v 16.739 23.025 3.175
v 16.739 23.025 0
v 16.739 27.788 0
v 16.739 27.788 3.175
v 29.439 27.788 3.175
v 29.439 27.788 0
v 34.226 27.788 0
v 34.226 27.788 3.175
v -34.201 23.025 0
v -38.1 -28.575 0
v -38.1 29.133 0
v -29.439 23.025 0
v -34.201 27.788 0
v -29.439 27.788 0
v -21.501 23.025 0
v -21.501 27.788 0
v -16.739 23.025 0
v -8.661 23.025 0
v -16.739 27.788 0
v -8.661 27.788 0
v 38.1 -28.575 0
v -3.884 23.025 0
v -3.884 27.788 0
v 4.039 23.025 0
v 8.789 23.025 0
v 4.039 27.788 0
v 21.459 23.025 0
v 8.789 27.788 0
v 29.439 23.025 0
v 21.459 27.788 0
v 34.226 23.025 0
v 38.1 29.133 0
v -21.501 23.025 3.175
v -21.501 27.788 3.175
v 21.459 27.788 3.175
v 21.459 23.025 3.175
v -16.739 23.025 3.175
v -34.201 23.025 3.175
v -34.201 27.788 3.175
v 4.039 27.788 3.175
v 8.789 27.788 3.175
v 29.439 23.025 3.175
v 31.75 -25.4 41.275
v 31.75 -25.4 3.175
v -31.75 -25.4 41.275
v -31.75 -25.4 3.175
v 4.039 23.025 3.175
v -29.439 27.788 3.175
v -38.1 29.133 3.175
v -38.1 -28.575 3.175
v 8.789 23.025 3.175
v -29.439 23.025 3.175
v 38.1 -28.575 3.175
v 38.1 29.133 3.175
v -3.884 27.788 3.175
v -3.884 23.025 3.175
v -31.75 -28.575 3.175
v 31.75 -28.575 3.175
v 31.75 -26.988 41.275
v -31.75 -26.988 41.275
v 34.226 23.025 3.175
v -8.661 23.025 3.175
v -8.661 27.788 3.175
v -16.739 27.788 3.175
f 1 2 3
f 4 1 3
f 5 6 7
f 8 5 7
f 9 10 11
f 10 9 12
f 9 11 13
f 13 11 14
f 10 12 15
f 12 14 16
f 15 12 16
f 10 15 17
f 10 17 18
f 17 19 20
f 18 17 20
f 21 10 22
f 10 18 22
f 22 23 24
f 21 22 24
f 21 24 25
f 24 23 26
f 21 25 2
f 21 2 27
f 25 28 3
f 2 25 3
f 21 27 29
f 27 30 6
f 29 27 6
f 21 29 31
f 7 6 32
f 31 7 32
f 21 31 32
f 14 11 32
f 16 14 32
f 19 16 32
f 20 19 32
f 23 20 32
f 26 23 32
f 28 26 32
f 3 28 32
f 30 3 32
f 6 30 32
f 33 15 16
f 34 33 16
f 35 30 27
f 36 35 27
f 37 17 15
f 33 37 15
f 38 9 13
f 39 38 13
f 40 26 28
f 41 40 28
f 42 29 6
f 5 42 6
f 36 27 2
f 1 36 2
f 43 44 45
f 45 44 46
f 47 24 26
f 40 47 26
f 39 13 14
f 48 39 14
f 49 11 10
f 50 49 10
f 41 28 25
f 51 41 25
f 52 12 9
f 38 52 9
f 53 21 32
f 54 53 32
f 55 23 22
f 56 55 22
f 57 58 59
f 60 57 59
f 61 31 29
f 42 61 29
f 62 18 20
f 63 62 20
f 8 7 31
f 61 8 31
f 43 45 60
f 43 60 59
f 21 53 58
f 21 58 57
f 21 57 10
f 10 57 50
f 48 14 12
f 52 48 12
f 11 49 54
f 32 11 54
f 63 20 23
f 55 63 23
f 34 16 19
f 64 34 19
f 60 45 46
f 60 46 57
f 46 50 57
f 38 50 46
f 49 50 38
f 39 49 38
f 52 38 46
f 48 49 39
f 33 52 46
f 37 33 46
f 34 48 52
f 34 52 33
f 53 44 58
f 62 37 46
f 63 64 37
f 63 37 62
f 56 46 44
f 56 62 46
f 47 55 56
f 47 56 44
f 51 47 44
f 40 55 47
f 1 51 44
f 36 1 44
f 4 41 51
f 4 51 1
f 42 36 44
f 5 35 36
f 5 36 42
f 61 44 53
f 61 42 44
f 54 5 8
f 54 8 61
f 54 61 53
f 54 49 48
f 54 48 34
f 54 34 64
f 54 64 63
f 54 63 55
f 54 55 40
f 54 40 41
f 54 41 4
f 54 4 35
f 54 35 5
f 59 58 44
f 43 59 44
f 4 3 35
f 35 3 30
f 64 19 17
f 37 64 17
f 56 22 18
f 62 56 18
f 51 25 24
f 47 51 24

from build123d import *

# Parameters (mm, degrees)
F0_W      = 3.8989
F0_H      = 3.9624
F1_DEPTH  = 3.175
F3_DEPTH  = 38.1
F5_DEPTH  = 64.262
F7_DEPTH  = 63.5
F9_DEPTH  = 25.4
F10_W     = 76.2
F10_H     = 2.617364
F11_DEPTH = 25.4


with BuildPart() as f1:
    # F0 (on Top) → F1 (new body)
    with BuildSketch(Plane.XY):
        Polygon((38.1, 27.7876), (38.1, 31.75), (-34.2011, 31.75), (-34.2011, 27.7876), (-29.4386, 27.7876), (-21.5011, 27.7876), (-16.7386, 27.7876), (-8.6614, 27.7876), (-3.8989, 27.7876), (-3.884394, 27.7876), (4.0386, 27.7876), (8.789393, 27.7876), (8.8011, 27.7876), (16.7386, 27.7876), (21.459464, 27.7876), (21.5011, 27.7876), (29.4386, 27.7876), (34.2011, 27.7876), (34.226403, 27.7876), align=None)
        with Locations((-36.15055, 29.7688)):
            Rectangle(F0_W, F0_H)
        Polygon((38.1, -31.75), (38.1, 27.7876), (34.226403, 27.7876), (34.226403, 23.0251), (29.4386, 23.0251), (29.4386, 27.7876), (21.5011, 27.7876), (21.459464, 27.7876), (21.459464, 23.0251), (16.7386, 23.0251), (16.7386, 27.7876), (8.8011, 27.7876), (8.789393, 27.7876), (8.789393, 23.0251), (4.0386, 23.0251), (4.0386, 27.7876), (-3.884394, 27.7876), (-3.884394, 23.0251), (-8.6614, 23.0251), (-8.6614, 27.7876), (-16.7386, 27.7876), (-16.7386, 23.0251), (-21.5011, 23.0251), (-21.5011, 27.7876), (-29.4386, 27.7876), (-29.4386, 23.0251), (-34.2011, 23.0251), (-34.2011, 15.0876), (-34.2011, 10.3251), (-34.2011, 2.3876), (-34.2011, -2.3749), (-34.2011, -10.3124), (-34.2011, -15.0749), (-34.2011, -23.0124), (-34.2011, -27.7749), (-34.2011, -31.75), align=None)
        Polygon((-34.2011, 23.0251), (-34.2011, 27.7876), (-38.1, 27.7876), (-38.1, -31.75), (-34.2011, -31.75), (-34.2011, -27.7749), (-34.2011, -23.0124), (-34.2011, -15.0749), (-34.2011, -10.3124), (-34.2011, -2.3749), (-34.2011, 2.3876), (-34.2011, 10.3251), (-34.2011, 15.0876), align=None)
    extrude(amount=F1_DEPTH)

    # F2 (on face) → F3 (join)
    with BuildSketch(Plane.XY.offset(3.175)):
        Polygon((-31.75, -28.575), (-31.75, -31.75), (31.75, -31.75), (31.75, -28.575), (31.75, -25.4), (-31.75, -25.4), align=None)
    extrude(amount=F3_DEPTH)

    # F4 (on face) → F5 (cut)
    with BuildSketch(Plane(origin=(-31.75, 0, 0), x_dir=(0, -1, 0), z_dir=(-1, 0, 0))):
        Polygon((31.75, 41.275), (28.575, 41.275), (31.75, 3.175), align=None)
    extrude(amount=-F5_DEPTH, mode=Mode.SUBTRACT)

    # F6 (on face) → F7 (cut)
    with BuildSketch(Plane.YZ.offset(31.75)):
        Polygon((-31.75, 3.175), (-28.575, 3.175), (-26.9875, 41.275), (-28.575, 41.275), align=None)
    extrude(amount=-F7_DEPTH, mode=Mode.SUBTRACT)

    # F8 (on face) → F9 (cut)
    with BuildSketch(Plane.XY.offset(3.175)):
        Polygon((38.1, -28.575), (-31.75, -28.575), (-38.1, -28.575), (-38.1, -31.75), (38.1, -31.75), align=None)
    extrude(amount=-F9_DEPTH, mode=Mode.SUBTRACT)

    # F10 (on face) → F11 (cut)
    with BuildSketch(Plane.XY.offset(3.175)):
        with Locations((0, 30.441318)):
            Rectangle(F10_W, F10_H)
    extrude(amount=-F11_DEPTH, mode=Mode.SUBTRACT)


solid = f1.part
